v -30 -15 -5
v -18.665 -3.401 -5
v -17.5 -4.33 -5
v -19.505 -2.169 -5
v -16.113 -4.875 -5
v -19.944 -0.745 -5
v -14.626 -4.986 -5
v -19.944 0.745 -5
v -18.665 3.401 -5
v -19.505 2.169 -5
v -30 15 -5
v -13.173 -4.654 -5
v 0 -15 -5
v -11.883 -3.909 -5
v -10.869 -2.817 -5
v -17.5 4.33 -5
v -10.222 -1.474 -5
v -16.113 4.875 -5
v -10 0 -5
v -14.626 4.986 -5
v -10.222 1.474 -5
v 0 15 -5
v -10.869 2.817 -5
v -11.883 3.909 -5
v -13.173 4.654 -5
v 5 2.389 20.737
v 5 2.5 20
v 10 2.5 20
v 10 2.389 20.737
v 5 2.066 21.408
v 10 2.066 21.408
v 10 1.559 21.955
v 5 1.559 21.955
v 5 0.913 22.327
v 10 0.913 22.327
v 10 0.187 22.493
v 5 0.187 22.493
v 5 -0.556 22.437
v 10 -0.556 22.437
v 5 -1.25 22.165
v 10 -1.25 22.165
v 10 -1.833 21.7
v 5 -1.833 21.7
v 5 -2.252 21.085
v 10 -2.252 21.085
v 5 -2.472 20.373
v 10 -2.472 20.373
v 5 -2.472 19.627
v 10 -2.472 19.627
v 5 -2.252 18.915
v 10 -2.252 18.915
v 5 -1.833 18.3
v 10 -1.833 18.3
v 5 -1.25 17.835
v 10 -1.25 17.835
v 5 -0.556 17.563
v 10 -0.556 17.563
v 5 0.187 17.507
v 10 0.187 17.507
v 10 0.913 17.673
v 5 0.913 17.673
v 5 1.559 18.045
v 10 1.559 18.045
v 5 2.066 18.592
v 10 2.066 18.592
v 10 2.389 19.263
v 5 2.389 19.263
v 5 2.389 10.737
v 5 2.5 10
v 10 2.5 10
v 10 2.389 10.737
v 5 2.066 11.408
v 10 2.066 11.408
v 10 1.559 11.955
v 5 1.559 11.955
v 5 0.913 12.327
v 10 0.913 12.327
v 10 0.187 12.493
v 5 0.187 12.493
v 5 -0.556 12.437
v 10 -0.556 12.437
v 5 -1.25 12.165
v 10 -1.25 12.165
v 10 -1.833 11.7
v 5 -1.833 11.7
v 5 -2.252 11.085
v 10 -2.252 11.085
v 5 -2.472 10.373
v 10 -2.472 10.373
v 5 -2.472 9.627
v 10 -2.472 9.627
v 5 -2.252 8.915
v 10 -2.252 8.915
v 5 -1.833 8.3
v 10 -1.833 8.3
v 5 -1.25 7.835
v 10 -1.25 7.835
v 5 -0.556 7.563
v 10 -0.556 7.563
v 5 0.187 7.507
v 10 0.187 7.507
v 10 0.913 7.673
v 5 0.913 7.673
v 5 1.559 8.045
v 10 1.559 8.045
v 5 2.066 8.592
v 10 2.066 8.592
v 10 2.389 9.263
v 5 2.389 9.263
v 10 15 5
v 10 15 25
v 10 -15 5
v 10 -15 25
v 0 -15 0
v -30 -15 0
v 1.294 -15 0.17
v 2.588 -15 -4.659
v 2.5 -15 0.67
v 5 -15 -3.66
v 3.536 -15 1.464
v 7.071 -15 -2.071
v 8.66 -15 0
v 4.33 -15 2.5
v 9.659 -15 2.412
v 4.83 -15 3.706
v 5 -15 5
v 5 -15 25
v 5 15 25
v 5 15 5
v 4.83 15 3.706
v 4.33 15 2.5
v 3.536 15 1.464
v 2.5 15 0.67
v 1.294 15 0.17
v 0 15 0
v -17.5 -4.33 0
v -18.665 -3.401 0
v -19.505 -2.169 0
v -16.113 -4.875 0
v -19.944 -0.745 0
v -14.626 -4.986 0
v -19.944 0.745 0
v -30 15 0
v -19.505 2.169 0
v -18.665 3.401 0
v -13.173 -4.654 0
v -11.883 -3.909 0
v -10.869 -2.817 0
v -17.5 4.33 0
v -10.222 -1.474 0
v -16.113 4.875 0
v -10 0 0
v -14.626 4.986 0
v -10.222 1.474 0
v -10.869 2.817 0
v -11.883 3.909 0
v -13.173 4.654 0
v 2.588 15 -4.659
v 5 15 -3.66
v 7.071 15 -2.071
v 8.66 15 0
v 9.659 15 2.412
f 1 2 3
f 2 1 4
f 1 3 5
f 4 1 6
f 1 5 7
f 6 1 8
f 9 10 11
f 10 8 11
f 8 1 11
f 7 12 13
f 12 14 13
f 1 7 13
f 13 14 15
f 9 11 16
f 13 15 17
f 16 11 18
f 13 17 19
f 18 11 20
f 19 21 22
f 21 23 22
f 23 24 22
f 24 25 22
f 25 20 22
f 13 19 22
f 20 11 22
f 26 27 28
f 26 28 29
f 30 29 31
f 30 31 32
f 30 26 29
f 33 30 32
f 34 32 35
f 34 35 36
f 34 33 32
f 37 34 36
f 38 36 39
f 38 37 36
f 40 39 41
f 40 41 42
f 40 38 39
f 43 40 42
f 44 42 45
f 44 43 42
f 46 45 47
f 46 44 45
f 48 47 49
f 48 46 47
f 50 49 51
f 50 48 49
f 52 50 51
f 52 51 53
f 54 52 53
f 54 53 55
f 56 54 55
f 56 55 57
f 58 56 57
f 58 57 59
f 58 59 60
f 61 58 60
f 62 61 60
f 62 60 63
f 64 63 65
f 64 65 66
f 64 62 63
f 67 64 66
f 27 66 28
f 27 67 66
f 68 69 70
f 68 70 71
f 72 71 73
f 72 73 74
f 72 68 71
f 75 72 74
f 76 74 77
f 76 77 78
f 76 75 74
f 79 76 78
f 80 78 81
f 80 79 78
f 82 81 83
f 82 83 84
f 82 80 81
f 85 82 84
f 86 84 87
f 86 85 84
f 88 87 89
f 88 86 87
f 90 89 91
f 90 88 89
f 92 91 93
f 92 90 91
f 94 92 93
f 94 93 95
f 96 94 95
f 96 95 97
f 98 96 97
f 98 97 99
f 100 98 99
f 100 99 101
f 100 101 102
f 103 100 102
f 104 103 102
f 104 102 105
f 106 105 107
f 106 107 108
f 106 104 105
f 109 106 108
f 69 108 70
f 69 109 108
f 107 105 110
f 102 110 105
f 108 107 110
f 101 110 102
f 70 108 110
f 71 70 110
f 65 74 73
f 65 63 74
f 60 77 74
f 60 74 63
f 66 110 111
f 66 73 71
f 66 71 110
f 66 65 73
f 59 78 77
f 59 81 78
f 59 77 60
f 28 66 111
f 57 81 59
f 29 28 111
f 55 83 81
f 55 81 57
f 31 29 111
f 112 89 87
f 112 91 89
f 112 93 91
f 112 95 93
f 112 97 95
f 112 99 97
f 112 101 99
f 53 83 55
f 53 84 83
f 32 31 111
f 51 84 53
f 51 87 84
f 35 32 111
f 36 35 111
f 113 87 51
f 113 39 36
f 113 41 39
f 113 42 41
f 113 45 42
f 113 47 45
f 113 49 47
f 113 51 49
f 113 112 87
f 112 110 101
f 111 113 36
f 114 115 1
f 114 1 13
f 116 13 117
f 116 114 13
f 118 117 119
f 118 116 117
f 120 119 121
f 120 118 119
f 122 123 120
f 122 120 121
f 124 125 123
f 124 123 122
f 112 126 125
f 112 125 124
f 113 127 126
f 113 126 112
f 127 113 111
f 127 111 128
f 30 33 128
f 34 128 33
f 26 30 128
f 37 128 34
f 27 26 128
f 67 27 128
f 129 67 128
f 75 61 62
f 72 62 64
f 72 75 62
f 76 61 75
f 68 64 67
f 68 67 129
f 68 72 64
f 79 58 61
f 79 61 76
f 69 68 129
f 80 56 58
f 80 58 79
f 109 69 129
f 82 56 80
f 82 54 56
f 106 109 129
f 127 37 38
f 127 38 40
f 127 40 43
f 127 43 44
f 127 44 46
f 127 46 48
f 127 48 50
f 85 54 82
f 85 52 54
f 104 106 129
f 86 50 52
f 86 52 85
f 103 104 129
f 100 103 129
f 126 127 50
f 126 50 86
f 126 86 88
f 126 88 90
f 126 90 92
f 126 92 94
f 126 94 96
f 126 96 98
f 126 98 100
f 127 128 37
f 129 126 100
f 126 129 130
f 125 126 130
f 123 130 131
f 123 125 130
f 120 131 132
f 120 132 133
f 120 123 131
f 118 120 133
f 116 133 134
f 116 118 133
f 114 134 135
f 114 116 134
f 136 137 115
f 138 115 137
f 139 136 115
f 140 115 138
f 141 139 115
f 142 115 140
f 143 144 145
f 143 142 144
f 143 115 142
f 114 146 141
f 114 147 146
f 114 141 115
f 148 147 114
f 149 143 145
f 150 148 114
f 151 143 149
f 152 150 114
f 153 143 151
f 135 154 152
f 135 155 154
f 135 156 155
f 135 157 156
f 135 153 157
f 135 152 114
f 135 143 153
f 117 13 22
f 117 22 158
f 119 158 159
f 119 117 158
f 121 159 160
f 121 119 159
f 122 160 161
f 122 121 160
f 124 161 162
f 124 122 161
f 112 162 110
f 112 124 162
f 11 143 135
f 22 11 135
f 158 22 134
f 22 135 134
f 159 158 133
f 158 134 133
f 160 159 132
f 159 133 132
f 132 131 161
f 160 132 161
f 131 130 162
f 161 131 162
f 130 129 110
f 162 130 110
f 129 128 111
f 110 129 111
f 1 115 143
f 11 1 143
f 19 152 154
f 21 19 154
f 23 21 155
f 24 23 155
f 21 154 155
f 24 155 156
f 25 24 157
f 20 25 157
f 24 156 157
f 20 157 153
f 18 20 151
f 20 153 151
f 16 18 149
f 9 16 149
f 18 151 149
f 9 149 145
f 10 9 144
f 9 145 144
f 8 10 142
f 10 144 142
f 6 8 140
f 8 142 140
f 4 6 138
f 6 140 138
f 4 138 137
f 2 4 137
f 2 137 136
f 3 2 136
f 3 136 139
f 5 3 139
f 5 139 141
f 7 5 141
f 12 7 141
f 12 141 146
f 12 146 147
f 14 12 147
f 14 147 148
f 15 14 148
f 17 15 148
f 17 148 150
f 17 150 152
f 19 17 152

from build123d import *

# Parameters (mm, degrees)
SKETCH1_W          = 30
SKETCH1_H          = 30
BASE_FLANGE1_DEPTH = 5
SKETCH6_R          = 5
CUT_EXTRUDE1_DEPTH = 34.911649916
EDGE_FLANGE1_DEPTH = 30
HOLE1_START        = 5
HOLE1_OUTLINE_R    = 2.5
HOLE1_DEPTH        = 5
LPATTERN1_COUNT    = 2
LPATTERN1_PITCH    = 10


# Read off the part's stored shape, not the designer's step: Hole1
# Sheet-metal steps are written as plain solids
with BuildPart() as part:
    # Sketch1 → Base-Flange1 (new body)
    with BuildSketch(Plane.XY):
        with Locations((-15, 0)):
            Rectangle(SKETCH1_W, SKETCH1_H)
    extrude(amount=-BASE_FLANGE1_DEPTH)

    # Sketch6 → Cut-Extrude1 (cut, through all)
    with BuildSketch(Plane.XY):
        with Locations((-15, 0)):
            Circle(SKETCH6_R)
    extrude(amount=-CUT_EXTRUDE1_DEPTH, mode=Mode.SUBTRACT)

    # Edge-Flange1 section (across the edge) → Edge-Flange1 (add)
    with BuildSketch(Plane(origin=(5, -15, 0), x_dir=(-1, 0, 0), z_dir=(0, 1, 0))):
        with BuildLine():
            Line((-5, 5), (-5, 25))
            Line((-5, 25), (0, 25))
            Line((0, 25), (0, 5))
            ThreePointArc((0, 5), (1.464466094, 1.464466094), (5, 0))
            Line((5, 0), (5, -5))
            ThreePointArc((5, -5), (-2.071067812, -2.071067812), (-5, 5))
        make_face()
    extrude(amount=EDGE_FLANGE1_DEPTH)

    # Hole1 outline → Hole1 (cut)
    with BuildSketch(Plane.YZ.offset(HOLE1_START)):
        with Locations((0, 10)):
            Circle(HOLE1_OUTLINE_R)
    hole1 = extrude(amount=HOLE1_DEPTH, mode=Mode.SUBTRACT)

    # LPattern1: Hole1 ×2
    with Locations(*[(0, 0, i * LPATTERN1_PITCH) for i in range(1, LPATTERN1_COUNT)]):
        add(hole1, mode=Mode.SUBTRACT)


solid = part.part
